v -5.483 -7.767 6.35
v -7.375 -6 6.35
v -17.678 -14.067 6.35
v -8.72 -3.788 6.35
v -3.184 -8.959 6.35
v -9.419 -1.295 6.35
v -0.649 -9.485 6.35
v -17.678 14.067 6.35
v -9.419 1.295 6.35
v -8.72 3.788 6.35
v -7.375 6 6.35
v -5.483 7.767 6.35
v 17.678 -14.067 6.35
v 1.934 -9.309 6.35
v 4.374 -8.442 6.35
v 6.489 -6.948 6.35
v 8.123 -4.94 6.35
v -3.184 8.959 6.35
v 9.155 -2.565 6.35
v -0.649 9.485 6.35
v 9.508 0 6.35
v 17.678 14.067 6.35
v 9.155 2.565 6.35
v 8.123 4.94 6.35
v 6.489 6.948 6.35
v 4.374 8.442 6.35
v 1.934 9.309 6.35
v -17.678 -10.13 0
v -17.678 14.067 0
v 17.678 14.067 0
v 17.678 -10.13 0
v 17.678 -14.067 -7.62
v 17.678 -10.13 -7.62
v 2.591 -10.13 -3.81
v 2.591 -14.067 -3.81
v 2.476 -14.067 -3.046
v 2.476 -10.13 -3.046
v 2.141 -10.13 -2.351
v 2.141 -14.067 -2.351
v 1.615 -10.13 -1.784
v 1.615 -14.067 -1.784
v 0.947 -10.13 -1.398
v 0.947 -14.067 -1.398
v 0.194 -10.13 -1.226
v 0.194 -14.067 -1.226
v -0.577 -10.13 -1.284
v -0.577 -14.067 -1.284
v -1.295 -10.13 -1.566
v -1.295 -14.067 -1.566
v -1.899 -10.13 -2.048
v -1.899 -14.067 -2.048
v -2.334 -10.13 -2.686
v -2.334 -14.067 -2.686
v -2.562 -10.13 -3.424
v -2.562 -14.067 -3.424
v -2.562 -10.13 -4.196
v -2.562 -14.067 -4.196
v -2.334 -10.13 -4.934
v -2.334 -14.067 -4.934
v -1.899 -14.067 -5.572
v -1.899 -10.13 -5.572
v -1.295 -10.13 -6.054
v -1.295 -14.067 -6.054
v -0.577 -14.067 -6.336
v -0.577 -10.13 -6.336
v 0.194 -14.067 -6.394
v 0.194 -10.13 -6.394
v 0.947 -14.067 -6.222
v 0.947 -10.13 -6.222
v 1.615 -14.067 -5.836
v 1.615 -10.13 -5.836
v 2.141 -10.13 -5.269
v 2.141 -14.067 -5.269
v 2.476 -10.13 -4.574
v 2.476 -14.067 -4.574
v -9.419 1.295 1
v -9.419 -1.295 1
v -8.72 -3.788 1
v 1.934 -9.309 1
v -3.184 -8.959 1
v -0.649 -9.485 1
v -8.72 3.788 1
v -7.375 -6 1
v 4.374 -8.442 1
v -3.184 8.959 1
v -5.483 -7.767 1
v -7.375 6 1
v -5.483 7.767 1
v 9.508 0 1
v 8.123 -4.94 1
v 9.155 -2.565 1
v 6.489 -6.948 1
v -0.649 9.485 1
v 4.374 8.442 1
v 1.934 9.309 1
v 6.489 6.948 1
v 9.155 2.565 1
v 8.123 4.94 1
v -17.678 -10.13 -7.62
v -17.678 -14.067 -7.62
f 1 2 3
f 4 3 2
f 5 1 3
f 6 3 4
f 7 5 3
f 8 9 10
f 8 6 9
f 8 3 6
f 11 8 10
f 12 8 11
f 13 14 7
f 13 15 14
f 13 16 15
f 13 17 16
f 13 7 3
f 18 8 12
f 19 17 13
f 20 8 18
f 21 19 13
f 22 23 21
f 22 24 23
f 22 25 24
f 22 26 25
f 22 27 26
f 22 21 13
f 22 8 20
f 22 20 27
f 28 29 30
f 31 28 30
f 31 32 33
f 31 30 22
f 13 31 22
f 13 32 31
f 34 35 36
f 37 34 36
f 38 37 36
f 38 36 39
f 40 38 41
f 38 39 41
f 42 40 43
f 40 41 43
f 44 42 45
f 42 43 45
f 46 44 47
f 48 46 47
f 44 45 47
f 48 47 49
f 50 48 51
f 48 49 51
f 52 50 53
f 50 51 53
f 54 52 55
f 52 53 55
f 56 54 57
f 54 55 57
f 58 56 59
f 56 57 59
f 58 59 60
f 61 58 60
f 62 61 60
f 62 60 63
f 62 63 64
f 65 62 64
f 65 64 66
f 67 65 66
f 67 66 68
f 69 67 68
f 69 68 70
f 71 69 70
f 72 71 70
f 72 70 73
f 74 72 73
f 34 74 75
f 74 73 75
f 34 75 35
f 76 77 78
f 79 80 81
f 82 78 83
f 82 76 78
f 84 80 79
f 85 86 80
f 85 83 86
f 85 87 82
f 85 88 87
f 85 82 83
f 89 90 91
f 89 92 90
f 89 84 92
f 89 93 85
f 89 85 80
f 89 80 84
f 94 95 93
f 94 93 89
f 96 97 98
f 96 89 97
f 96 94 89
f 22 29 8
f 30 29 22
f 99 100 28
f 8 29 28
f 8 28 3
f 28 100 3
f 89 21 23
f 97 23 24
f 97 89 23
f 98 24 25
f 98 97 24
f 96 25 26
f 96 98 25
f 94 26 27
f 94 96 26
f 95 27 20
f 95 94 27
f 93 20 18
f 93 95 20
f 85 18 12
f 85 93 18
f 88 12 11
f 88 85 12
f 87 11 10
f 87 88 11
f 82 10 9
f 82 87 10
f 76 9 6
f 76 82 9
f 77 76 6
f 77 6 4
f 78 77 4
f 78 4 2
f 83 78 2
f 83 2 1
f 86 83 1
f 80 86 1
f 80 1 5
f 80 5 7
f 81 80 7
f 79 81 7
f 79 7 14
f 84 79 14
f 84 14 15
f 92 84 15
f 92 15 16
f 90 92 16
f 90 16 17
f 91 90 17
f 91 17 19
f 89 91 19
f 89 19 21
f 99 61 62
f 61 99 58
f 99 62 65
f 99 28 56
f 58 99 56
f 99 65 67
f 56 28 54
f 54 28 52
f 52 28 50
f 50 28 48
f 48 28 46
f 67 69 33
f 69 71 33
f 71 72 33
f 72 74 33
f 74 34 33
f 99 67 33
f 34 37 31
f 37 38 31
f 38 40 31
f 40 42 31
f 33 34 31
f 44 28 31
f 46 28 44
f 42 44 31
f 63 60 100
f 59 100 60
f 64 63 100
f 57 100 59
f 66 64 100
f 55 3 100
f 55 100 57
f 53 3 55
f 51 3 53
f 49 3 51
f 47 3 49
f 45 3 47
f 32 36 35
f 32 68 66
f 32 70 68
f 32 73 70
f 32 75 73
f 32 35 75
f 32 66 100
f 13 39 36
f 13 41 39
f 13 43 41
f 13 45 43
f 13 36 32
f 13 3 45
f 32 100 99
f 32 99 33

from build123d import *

# Parameters (mm, degrees)
F0_W     = 35.35511
F0_H     = 28.1335
F0_R     = 9.5075
F1_DEPTH = 1
F2_DEPTH = 6.35
F3_W     = 35.35511
F3_H     = 7.62
F3_R     = 2.5908
F4_DEPTH = 3.937


with BuildPart() as f1:
    # F0 (on Top) → F1 (new body)
    with BuildSketch(Plane.XY):
        Rectangle(F0_W, F0_H)
        Circle(F0_R, mode=Mode.SUBTRACT)
        Circle(F0_R)
    extrude(amount=F1_DEPTH)

    # F0 (on Top) → F2 (join)
    with BuildSketch(Plane.XY):
        Rectangle(F0_W, F0_H)
        Circle(F0_R, mode=Mode.SUBTRACT)
    extrude(amount=F2_DEPTH)

    # F3 (on face) → F4 (join)
    with BuildSketch(Plane.XZ.offset(14.06675)):
        with Locations((0, -3.81)):
            Rectangle(F3_W, F3_H)
        with Locations((0, -3.81)):
            Circle(F3_R, mode=Mode.SUBTRACT)
    extrude(amount=-F4_DEPTH)


solid = f1.part
